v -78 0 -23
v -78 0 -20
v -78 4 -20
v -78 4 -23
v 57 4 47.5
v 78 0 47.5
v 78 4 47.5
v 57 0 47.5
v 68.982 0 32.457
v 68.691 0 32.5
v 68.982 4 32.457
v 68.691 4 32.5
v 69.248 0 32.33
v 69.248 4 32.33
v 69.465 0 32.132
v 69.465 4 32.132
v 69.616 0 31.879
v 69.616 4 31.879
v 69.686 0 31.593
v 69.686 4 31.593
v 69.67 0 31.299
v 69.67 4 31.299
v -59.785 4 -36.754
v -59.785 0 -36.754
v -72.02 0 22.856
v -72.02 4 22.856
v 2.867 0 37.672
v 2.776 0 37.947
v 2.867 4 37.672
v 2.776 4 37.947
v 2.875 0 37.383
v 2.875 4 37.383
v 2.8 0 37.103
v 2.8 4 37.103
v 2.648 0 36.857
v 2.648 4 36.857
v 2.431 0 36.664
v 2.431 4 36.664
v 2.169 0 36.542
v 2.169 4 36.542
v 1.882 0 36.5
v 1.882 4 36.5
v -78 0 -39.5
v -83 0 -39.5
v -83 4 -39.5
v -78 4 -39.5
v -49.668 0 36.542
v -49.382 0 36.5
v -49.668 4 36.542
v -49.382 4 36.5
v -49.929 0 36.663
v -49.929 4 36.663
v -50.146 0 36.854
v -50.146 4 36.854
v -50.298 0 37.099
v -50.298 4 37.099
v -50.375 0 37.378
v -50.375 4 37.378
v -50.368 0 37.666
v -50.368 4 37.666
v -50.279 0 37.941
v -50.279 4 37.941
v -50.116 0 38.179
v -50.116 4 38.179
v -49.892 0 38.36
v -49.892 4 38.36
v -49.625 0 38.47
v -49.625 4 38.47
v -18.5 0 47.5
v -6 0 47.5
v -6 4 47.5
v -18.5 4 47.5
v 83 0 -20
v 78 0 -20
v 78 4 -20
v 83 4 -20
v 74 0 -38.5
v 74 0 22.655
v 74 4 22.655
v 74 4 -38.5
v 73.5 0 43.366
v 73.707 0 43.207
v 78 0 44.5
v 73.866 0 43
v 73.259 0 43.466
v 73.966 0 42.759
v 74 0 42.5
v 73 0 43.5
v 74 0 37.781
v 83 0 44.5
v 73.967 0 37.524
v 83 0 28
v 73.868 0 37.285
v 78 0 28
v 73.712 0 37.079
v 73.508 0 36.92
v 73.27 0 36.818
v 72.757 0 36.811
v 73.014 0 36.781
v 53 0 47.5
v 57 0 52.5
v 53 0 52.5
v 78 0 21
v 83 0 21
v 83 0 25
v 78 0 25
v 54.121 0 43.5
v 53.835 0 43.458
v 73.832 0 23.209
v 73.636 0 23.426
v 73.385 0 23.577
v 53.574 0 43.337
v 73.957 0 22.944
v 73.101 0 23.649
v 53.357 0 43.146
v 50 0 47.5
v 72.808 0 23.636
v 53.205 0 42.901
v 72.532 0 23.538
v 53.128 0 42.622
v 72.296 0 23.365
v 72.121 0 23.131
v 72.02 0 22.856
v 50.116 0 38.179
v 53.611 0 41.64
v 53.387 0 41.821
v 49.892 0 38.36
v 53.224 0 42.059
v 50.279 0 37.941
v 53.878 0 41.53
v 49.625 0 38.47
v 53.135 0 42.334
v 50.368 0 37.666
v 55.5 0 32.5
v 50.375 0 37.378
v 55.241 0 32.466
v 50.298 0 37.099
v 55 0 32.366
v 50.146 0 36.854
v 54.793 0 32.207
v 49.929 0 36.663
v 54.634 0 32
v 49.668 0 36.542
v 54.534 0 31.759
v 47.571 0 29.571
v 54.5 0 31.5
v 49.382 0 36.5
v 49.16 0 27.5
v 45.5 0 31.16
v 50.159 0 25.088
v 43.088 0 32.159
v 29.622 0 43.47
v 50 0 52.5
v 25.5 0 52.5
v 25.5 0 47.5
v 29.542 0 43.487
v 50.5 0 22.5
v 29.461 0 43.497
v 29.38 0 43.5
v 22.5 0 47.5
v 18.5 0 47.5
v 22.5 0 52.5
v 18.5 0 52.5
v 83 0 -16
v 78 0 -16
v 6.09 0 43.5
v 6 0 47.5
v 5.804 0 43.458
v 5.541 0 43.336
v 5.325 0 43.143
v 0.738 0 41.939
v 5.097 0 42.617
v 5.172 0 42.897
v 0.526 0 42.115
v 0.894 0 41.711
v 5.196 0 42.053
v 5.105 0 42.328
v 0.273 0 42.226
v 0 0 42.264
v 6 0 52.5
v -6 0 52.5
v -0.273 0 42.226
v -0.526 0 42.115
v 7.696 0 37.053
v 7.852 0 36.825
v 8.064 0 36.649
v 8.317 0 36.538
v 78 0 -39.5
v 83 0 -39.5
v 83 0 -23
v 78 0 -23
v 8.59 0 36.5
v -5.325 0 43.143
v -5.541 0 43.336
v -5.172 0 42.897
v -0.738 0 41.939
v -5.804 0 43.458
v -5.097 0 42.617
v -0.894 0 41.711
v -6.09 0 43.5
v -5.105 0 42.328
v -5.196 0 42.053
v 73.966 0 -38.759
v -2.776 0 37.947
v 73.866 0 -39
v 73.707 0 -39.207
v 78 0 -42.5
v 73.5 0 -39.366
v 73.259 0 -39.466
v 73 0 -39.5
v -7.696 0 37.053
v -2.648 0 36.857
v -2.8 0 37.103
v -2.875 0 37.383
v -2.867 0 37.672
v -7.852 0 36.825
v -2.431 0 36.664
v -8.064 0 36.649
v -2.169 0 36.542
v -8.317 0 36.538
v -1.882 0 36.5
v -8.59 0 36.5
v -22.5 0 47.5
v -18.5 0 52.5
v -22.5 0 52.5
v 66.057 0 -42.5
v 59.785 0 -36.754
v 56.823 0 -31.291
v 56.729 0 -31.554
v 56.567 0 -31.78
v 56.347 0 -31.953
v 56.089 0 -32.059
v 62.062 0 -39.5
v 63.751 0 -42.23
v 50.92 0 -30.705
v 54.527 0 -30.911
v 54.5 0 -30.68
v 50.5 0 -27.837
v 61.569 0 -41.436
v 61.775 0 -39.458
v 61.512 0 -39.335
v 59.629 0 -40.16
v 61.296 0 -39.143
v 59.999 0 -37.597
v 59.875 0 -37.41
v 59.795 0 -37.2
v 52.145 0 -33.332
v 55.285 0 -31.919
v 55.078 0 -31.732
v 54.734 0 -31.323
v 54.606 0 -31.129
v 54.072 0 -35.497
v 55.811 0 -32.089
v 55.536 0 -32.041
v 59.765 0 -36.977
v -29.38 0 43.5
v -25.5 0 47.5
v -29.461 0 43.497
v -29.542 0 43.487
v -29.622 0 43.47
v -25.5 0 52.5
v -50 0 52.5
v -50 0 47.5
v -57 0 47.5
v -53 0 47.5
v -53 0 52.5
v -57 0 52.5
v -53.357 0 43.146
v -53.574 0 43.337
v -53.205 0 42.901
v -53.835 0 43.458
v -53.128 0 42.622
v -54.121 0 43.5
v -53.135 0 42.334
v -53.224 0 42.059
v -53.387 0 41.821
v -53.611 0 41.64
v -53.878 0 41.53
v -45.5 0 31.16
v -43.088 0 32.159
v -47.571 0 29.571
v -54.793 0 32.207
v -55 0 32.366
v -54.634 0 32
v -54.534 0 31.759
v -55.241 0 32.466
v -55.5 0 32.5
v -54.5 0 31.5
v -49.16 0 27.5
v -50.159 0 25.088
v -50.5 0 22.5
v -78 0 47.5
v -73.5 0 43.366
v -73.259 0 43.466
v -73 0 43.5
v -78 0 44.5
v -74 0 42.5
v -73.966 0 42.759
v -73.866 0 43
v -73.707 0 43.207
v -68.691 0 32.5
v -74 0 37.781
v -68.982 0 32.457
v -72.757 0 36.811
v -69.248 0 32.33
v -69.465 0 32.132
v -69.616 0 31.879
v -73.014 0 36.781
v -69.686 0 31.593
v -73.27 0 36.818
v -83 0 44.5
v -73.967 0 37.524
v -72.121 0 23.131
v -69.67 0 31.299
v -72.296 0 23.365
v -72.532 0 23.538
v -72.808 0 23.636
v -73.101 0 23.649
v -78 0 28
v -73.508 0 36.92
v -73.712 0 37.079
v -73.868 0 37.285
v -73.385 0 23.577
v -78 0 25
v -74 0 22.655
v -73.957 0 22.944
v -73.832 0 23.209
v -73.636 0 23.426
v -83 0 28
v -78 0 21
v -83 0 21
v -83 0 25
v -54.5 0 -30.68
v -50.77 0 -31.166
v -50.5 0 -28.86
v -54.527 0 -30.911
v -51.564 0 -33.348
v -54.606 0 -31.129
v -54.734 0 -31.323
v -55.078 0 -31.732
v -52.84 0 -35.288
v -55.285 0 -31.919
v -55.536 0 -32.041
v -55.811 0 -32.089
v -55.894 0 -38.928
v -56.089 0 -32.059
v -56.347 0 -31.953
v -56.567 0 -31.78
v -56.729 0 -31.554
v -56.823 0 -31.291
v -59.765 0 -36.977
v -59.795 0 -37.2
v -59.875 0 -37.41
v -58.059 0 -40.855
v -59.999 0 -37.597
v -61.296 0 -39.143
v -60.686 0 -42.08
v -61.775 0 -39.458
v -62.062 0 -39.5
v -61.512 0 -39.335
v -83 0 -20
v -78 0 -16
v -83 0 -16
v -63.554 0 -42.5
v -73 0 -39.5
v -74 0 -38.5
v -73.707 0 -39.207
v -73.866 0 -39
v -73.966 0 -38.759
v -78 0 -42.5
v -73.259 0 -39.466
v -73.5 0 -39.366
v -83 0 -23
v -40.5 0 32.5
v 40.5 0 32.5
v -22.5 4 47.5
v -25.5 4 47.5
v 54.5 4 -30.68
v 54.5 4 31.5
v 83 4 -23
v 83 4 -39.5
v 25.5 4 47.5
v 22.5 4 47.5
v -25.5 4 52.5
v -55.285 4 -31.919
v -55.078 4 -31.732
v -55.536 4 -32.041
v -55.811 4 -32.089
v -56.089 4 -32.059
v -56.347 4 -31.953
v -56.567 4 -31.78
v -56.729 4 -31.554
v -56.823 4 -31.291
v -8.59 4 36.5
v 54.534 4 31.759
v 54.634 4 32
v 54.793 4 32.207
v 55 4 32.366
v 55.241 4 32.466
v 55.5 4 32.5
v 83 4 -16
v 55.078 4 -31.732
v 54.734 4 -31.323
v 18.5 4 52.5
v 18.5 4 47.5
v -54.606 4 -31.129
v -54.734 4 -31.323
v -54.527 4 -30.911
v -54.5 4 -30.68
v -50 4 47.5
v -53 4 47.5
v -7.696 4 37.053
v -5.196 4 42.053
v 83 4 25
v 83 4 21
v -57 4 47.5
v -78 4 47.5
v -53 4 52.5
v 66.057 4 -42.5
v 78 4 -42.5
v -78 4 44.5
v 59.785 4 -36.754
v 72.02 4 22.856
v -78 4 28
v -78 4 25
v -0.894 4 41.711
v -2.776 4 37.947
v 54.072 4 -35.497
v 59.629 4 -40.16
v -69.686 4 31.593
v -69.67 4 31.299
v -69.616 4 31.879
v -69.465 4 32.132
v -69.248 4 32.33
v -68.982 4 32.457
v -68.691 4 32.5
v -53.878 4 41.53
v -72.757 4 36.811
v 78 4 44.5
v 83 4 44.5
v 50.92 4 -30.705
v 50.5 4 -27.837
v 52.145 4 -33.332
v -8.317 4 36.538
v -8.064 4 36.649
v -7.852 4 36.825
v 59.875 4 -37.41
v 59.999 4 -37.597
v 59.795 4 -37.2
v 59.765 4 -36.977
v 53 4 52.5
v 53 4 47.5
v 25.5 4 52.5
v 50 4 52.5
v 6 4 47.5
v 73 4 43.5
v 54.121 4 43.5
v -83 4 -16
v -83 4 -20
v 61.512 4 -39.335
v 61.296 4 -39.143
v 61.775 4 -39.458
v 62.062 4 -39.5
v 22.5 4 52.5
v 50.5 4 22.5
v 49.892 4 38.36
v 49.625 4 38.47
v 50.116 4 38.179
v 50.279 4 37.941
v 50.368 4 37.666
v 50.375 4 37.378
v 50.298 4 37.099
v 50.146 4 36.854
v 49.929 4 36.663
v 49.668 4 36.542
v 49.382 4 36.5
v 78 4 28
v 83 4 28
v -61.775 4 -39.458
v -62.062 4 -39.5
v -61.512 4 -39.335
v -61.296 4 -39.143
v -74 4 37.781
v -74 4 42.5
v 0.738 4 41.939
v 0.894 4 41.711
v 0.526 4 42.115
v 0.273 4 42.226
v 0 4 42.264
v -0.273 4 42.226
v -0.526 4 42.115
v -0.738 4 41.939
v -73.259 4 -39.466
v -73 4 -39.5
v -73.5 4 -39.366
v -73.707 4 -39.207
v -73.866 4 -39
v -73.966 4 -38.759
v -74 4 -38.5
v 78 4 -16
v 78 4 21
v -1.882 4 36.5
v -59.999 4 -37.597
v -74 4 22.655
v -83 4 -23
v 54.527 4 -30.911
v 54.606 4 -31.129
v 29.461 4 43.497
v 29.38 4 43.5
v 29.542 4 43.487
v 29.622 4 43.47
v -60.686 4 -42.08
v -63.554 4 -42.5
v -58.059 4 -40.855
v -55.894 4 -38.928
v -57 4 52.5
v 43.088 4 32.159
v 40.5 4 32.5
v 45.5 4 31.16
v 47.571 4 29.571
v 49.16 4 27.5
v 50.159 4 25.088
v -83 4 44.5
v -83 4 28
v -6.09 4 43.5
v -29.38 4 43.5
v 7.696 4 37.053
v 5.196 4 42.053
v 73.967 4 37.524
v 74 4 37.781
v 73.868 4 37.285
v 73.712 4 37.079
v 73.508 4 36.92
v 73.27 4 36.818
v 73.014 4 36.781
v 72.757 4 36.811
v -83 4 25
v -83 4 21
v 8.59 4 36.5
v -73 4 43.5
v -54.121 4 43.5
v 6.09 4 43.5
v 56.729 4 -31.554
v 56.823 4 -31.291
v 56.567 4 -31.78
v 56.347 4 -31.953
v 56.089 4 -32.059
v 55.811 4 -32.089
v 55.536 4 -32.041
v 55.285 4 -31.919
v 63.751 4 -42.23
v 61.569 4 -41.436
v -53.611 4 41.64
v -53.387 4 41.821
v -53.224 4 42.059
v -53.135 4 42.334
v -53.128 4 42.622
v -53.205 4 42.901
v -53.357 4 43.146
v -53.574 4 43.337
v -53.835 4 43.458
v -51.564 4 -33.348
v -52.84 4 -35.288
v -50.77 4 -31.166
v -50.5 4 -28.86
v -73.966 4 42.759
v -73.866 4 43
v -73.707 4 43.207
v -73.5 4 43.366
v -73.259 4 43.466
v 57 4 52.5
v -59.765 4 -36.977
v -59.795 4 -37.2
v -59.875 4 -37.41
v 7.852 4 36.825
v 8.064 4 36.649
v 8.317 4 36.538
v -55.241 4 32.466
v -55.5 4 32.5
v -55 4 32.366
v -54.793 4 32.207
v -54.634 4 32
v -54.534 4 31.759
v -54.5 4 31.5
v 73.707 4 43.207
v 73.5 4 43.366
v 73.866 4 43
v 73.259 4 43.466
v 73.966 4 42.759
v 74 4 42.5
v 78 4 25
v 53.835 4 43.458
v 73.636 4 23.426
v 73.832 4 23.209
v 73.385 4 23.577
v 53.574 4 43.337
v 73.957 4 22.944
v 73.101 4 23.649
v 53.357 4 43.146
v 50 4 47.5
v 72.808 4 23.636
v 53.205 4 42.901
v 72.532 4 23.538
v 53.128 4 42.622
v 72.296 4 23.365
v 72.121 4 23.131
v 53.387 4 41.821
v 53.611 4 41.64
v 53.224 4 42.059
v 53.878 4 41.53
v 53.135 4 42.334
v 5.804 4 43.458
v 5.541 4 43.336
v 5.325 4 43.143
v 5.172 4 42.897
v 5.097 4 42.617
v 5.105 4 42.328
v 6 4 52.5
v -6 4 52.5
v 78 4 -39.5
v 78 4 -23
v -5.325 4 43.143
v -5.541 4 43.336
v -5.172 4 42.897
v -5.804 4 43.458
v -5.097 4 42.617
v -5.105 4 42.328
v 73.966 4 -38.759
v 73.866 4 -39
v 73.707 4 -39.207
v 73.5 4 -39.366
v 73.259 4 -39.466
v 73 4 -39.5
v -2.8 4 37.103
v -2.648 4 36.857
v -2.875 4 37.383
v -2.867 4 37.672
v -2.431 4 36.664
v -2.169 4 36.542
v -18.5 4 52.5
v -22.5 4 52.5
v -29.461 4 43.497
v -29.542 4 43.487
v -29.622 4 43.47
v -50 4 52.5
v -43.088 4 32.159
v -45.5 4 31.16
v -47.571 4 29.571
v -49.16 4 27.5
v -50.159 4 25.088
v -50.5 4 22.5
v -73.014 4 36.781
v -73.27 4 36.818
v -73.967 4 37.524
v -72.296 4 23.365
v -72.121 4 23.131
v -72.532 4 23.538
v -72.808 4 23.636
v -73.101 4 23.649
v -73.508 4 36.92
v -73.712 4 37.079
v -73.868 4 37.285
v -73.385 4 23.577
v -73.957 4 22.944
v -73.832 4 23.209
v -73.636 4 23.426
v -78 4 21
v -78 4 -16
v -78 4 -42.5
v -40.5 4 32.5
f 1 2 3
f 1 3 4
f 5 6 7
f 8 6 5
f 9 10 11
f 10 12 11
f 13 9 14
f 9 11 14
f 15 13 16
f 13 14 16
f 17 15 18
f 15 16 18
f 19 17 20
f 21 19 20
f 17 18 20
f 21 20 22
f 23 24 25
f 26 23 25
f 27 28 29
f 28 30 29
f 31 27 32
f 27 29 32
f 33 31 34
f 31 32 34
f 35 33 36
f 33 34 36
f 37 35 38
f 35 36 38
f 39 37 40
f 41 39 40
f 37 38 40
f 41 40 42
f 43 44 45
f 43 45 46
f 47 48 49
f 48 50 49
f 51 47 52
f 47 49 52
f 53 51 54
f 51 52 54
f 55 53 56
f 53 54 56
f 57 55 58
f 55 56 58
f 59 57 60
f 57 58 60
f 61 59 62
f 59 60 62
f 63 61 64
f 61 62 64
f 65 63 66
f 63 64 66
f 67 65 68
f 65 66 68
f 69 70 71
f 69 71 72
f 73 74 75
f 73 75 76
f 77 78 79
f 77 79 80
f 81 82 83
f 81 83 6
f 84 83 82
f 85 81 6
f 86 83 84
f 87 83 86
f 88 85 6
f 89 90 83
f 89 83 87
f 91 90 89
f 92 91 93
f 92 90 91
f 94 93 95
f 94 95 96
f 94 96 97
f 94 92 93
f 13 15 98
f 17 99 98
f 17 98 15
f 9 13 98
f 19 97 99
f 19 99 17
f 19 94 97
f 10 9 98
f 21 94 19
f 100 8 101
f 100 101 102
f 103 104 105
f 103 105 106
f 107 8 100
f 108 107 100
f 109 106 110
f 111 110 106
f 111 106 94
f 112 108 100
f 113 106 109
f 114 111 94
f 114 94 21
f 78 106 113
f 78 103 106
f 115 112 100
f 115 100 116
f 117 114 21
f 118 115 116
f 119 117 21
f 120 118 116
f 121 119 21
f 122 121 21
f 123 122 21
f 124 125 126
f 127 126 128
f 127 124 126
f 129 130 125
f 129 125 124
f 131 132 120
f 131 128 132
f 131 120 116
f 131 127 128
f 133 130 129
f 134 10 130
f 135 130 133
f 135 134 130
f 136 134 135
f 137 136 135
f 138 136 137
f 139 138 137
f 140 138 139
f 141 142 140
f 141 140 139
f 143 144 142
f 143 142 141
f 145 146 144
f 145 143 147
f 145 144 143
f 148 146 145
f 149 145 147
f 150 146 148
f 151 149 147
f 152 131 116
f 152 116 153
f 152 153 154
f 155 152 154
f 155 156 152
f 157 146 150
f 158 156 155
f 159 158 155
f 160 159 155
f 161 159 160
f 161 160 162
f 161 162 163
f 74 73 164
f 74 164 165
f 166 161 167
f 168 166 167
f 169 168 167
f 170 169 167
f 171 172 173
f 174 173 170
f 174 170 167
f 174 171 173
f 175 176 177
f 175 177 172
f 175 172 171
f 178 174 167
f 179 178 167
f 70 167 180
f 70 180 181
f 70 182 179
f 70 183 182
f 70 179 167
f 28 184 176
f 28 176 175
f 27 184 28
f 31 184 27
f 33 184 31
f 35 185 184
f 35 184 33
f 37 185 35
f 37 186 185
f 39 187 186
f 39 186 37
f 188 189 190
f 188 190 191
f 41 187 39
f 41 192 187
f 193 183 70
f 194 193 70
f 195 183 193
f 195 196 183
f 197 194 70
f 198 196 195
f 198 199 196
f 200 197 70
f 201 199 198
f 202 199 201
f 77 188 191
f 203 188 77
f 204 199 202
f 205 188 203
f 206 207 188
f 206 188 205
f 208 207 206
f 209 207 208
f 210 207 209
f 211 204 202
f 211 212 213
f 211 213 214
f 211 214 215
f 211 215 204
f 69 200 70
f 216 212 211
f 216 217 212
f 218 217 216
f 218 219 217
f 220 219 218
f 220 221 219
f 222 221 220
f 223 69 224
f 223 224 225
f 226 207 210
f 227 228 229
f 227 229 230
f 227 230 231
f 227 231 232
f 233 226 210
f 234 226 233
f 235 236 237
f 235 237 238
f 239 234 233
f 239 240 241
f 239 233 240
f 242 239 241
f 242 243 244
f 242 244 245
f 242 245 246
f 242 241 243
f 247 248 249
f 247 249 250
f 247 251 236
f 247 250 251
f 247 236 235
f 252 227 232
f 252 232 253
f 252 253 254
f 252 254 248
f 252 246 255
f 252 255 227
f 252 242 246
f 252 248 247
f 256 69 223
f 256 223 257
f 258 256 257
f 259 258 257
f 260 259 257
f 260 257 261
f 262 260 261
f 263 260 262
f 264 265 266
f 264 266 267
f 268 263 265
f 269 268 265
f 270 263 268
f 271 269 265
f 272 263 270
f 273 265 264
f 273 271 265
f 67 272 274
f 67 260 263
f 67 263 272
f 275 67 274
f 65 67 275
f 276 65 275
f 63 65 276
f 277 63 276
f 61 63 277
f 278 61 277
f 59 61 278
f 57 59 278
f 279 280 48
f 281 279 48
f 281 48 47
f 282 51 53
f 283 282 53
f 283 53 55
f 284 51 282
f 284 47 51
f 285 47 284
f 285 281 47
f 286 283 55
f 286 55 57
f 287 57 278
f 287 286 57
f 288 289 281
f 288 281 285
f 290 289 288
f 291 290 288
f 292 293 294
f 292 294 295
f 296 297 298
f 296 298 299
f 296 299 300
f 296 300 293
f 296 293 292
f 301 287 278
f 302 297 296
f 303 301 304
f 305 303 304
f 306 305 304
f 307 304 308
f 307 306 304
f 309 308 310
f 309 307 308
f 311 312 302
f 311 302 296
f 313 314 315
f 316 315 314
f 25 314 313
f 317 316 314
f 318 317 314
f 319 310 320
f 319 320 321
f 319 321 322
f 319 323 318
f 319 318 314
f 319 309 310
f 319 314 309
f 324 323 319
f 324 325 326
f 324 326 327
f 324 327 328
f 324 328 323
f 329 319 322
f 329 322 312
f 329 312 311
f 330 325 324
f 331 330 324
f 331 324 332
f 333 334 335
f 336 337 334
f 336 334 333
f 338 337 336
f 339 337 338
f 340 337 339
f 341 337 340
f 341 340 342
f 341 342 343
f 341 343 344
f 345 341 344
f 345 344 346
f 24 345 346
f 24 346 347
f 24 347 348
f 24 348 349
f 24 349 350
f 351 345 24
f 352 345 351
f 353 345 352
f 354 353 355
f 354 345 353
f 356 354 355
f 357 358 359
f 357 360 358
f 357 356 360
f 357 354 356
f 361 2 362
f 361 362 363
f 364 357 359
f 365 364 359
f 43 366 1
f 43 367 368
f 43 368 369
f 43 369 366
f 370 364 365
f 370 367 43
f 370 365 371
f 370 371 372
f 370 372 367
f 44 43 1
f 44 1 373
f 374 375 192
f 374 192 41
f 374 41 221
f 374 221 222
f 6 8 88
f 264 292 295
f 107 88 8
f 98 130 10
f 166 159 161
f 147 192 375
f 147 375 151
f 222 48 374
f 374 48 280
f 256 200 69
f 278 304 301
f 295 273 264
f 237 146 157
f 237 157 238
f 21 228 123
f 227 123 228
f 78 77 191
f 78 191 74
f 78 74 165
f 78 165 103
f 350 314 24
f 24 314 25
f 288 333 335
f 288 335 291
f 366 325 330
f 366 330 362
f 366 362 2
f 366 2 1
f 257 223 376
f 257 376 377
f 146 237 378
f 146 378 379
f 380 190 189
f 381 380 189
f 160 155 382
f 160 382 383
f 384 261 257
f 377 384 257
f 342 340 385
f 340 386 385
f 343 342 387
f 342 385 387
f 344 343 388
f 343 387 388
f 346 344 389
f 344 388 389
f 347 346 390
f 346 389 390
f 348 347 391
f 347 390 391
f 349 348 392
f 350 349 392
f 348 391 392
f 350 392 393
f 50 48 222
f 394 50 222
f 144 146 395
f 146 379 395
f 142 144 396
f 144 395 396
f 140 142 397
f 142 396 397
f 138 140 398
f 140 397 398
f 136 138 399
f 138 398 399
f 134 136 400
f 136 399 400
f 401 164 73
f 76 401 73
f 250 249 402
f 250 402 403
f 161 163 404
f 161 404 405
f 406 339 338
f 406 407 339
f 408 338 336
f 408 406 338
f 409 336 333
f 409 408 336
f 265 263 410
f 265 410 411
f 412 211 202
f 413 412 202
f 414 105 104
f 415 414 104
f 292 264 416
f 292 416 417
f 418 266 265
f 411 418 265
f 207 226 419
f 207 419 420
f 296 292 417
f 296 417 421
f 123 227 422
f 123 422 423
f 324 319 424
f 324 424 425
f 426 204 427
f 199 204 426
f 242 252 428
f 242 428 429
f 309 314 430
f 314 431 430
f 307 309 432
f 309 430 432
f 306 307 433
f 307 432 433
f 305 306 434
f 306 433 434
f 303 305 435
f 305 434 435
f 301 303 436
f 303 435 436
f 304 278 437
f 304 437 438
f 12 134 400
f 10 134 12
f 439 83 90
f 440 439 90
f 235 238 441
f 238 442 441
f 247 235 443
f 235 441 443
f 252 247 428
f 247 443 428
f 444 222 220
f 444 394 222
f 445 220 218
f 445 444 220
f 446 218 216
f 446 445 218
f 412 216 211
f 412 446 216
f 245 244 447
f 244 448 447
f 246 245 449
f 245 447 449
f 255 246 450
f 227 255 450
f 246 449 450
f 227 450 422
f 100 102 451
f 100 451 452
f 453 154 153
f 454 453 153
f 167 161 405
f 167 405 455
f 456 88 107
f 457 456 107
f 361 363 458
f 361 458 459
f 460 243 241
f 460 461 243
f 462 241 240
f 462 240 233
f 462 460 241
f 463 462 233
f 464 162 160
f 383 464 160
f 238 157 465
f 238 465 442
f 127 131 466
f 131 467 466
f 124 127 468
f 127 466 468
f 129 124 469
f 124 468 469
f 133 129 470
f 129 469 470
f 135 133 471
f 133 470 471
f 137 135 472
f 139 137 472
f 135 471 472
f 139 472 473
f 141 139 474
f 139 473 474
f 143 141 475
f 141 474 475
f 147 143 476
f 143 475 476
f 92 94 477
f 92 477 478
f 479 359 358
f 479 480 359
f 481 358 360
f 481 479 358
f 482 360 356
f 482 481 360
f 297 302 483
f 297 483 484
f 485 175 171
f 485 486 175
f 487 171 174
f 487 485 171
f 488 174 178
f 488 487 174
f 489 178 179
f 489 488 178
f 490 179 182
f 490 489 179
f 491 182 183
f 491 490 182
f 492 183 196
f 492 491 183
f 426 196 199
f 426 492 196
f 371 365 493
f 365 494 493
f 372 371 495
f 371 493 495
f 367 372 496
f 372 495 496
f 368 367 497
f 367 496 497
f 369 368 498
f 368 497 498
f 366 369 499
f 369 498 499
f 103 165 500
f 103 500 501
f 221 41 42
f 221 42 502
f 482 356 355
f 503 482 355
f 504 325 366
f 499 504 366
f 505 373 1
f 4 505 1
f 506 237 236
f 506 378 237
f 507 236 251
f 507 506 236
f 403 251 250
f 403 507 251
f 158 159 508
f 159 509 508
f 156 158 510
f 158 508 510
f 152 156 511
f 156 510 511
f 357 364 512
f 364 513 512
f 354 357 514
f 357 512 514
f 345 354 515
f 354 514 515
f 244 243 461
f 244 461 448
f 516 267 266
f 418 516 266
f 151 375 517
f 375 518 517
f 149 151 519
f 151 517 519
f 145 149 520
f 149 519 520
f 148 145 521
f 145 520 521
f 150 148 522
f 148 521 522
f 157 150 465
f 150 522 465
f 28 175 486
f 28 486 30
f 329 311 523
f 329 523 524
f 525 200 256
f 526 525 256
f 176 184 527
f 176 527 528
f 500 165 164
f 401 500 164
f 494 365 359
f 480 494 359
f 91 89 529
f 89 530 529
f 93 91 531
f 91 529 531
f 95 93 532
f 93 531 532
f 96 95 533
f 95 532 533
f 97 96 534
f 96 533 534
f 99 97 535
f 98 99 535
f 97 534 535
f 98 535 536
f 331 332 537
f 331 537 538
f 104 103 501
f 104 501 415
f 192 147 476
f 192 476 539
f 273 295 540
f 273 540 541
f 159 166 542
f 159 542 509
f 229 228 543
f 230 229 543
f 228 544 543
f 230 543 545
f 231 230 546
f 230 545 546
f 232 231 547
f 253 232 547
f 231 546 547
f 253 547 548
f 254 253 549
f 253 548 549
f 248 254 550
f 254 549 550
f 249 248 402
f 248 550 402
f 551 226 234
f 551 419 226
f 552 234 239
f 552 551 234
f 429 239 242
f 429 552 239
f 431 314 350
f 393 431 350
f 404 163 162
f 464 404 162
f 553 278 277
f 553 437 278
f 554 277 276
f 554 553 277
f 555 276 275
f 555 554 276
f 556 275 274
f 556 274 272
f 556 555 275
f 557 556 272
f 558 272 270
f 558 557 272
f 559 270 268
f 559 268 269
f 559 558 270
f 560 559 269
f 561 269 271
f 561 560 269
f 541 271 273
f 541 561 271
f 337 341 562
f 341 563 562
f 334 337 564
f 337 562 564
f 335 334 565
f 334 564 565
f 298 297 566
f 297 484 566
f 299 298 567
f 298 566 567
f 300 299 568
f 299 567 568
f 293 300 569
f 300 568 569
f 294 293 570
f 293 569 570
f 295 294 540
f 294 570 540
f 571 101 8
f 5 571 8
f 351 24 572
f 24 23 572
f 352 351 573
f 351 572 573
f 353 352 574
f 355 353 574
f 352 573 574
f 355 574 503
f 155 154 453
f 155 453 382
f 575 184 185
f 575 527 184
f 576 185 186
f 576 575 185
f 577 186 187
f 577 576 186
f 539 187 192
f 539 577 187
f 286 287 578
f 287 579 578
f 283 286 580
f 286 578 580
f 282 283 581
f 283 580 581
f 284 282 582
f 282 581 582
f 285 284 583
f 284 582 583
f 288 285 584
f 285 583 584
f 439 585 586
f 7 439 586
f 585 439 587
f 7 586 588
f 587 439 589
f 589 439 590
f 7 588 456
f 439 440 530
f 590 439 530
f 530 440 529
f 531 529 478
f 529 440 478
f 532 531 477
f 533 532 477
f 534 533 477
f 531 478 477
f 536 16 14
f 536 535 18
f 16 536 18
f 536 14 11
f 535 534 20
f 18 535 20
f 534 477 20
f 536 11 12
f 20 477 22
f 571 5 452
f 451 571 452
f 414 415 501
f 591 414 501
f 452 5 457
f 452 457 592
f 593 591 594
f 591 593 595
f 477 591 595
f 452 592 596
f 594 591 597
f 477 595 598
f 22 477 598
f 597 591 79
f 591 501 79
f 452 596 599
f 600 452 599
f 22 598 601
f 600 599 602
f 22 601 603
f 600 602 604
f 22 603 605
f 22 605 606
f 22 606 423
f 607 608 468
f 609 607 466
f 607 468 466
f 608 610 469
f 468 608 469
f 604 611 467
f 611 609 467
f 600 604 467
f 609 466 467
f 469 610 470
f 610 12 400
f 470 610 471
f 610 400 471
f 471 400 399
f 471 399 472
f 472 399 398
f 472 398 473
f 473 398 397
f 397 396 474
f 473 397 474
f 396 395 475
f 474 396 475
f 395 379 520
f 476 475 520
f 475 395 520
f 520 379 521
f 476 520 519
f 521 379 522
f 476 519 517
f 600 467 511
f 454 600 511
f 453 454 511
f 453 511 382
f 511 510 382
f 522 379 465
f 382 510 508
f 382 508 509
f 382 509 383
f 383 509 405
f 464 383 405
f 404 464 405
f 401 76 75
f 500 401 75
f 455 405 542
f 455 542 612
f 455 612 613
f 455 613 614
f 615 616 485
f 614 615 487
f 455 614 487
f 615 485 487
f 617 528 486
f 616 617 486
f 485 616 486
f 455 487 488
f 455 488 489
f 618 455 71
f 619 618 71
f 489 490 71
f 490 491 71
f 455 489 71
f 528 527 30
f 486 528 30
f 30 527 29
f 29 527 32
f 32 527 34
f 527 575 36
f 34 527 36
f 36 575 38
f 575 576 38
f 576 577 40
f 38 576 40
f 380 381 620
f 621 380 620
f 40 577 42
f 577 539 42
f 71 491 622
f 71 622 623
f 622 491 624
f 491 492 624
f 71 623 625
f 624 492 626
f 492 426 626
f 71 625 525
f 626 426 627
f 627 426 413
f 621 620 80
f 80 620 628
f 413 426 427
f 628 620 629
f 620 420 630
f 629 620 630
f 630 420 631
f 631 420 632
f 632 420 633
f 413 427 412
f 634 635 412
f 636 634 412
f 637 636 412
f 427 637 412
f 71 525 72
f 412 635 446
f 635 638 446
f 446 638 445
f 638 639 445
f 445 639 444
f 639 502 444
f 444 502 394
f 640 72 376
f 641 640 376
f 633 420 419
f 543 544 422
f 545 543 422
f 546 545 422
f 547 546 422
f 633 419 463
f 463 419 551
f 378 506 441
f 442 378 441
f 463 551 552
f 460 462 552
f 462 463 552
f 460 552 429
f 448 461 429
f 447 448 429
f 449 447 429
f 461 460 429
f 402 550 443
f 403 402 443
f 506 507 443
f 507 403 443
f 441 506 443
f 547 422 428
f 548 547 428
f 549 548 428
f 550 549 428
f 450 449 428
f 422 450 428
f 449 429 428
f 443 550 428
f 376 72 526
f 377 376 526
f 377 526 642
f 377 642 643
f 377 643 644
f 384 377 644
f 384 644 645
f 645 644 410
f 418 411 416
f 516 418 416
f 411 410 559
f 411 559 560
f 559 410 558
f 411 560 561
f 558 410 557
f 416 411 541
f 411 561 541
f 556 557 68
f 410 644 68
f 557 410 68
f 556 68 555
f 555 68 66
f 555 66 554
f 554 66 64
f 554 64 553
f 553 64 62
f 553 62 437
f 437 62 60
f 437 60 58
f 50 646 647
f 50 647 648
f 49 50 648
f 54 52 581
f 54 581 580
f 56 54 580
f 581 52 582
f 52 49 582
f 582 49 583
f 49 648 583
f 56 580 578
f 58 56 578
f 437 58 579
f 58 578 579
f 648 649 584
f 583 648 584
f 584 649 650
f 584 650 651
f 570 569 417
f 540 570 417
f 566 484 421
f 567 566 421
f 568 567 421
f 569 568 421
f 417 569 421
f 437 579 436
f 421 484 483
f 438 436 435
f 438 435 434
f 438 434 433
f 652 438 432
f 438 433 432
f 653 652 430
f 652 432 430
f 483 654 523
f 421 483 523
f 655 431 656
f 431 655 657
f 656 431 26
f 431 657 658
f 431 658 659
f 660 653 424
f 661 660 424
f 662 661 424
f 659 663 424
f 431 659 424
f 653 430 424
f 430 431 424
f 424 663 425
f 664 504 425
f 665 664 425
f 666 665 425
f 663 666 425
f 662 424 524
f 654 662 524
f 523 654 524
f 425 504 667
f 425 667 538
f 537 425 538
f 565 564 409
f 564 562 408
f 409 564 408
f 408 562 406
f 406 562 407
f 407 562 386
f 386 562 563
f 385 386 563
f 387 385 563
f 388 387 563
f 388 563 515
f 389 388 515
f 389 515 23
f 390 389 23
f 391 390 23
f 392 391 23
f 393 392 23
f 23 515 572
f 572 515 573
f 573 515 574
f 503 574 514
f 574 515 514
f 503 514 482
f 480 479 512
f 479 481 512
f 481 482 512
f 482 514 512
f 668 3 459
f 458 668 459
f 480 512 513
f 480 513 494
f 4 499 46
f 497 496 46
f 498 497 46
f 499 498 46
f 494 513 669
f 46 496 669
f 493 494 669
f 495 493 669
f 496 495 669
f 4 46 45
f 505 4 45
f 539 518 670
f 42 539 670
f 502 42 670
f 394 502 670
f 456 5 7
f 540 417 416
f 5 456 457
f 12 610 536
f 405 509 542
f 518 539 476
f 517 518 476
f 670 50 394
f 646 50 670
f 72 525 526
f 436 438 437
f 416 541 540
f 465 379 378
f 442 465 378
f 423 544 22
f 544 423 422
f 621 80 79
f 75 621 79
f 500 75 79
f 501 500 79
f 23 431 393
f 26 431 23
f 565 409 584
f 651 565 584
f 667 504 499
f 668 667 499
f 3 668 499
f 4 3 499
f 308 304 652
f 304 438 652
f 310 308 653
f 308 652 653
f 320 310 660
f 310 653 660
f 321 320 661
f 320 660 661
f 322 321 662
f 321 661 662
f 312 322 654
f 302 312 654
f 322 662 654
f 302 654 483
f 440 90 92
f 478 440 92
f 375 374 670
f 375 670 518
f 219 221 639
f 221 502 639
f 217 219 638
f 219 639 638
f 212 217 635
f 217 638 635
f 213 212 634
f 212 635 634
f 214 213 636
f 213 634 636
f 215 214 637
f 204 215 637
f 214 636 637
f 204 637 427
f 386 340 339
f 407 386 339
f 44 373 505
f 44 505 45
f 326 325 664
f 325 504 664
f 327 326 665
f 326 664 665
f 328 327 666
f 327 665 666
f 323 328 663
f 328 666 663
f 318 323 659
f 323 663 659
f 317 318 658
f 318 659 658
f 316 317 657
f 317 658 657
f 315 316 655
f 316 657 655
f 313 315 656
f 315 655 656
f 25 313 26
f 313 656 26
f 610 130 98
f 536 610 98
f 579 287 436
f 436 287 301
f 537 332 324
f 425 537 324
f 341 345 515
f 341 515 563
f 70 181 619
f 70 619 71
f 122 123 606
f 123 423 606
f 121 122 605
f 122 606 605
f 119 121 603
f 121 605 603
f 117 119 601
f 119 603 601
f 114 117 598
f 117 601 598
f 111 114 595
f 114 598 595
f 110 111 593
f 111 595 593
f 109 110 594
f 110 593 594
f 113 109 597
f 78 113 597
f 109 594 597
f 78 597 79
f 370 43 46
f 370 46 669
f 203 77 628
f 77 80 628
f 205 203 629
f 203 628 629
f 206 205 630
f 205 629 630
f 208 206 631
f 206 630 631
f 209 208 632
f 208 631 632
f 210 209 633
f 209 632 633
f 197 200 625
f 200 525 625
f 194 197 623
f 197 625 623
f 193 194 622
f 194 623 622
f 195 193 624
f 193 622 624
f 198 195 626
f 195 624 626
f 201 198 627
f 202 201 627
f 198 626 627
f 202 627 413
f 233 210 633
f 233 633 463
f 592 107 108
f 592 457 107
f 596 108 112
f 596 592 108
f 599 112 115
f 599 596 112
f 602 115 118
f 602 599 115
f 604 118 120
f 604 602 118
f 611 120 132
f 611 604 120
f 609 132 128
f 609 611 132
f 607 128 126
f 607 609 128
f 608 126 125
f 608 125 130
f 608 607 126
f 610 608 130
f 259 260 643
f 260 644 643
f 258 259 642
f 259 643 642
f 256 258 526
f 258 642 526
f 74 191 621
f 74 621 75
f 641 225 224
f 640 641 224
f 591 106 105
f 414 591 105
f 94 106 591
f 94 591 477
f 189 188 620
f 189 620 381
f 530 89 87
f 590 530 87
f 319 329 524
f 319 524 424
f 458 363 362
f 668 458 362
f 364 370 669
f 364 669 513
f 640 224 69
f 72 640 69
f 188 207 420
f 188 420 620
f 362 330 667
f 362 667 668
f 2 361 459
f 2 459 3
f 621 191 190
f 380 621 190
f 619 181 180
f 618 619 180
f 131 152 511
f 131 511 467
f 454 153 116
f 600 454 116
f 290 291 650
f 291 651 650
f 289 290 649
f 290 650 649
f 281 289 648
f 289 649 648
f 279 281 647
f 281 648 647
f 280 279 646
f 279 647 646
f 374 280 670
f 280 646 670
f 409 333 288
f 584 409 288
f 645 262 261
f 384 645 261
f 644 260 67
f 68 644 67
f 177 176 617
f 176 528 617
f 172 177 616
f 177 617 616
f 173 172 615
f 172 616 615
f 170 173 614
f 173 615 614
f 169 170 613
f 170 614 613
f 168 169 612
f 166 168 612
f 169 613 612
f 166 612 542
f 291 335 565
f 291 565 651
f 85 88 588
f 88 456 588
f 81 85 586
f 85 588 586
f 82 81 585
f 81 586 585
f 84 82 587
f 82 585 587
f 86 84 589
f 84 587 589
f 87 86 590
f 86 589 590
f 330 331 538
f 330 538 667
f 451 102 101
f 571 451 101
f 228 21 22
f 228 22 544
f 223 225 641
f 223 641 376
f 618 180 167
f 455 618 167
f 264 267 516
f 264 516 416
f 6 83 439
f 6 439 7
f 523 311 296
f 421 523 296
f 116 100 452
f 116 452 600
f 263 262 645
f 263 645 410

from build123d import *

# Parameters (mm, degrees)
SKETCH1_W           = 5
SKETCH1_H           = 16.5
SKETCH1_W_2         = 12
SKETCH1_H_2         = 5
SKETCH1_H_3         = 4
SKETCH1_W_3         = 24.5
SKETCH1_W_4         = 4
BOSS_EXTRUDE1_DEPTH = 4
FILLET1_R           = 10
FILLET2_R           = 1


with BuildPart() as part:
    # Sketch1 → Boss-Extrude1 (new body)
    # profile 1 of 16: a face of its own
    with BuildSketch(Plane(origin=(0, 0, 0), x_dir=(1, 0, 0), z_dir=(0, 1, 0))):
        Polygon((-78, 42.5), (-58.890996312, 42.5), (-50.5, 32.5), (-50.5, -32.5), (50.5, -32.5), (50.5, 32.5), (62.417535926, 42.5), (78, 42.5), (78, -47.5), (-78, -47.5), align=None)
        Polygon((-74, 39.5), (-61.595326576, 39.5), (-59.688086754, 37.22704009), (-74, -32.5), align=None, mode=Mode.SUBTRACT)
        Polygon((-56.407239822, 33.317078972), (-54.5, 31.044119063), (-54.5, -32.5), (-69.916608972, -32.5), align=None, mode=Mode.SUBTRACT)
        Polygon((-74, -36.5), (-74, -43.5), (-45.997033515, -43.5), align=None, mode=Mode.SUBTRACT)
        Polygon((-57.50593297, -36.5), (-7.972135955, -36.5), (-4.472135955, -43.5), (-29.502966485, -43.5), align=None, mode=Mode.SUBTRACT)
        Polygon((3.5, -36.5), (-3.5, -36.5), (0, -43.5), align=None, mode=Mode.SUBTRACT)
        Polygon((4.472135955, -43.5), (29.502966485, -43.5), (57.50593297, -36.5), (7.972135955, -36.5), align=None, mode=Mode.SUBTRACT)
        Polygon((74, -43.5), (45.997033515, -43.5), (74, -36.5), align=None, mode=Mode.SUBTRACT)
        Polygon((54.5, -32.5), (69.916608972, -32.5), (56.407239822, 33.317078972), (54.5, 31.044119063), align=None, mode=Mode.SUBTRACT)
        Polygon((59.688086754, 37.22704009), (74, -32.5), (74, 39.5), (61.595326576, 39.5), align=None, mode=Mode.SUBTRACT)
    # profile 2 of 16: a face of its own
    with BuildSketch(Plane(origin=(0, 0, 0), x_dir=(1, 0, 0), z_dir=(0, 1, 0))):
        with Locations((80.5, 31.25)):
            Rectangle(SKETCH1_W, SKETCH1_H)
    # profile 3 of 16: a face of its own
    with BuildSketch(Plane(origin=(0, 0, 0), x_dir=(1, 0, 0), z_dir=(0, 1, 0))):
        with Locations((80.5, -36.25)):
            Rectangle(SKETCH1_W, SKETCH1_H)
    # profile 4 of 16: a face of its own
    with BuildSketch(Plane(origin=(0, 0, 0), x_dir=(1, 0, 0), z_dir=(0, 1, 0))):
        with Locations((0, -50)):
            Rectangle(SKETCH1_W_2, SKETCH1_H_2)
    # profile 5 of 16: a face of its own
    with BuildSketch(Plane(origin=(0, 0, 0), x_dir=(1, 0, 0), z_dir=(0, 1, 0))):
        with Locations((80.5, 18)):
            Rectangle(SKETCH1_W, SKETCH1_H_3)
    # profile 6 of 16: a face of its own
    with BuildSketch(Plane(origin=(0, 0, 0), x_dir=(1, 0, 0), z_dir=(0, 1, 0))):
        with Locations((80.5, -23)):
            Rectangle(SKETCH1_W, SKETCH1_H_3)
    # profile 7 of 16: a face of its own
    with BuildSketch(Plane(origin=(0, 0, 0), x_dir=(1, 0, 0), z_dir=(0, 1, 0))):
        with Locations((37.75, -50)):
            Rectangle(SKETCH1_W_3, SKETCH1_H_2)
    # profile 8 of 16: a face of its own
    with BuildSketch(Plane(origin=(0, 0, 0), x_dir=(1, 0, 0), z_dir=(0, 1, 0))):
        with Locations((55, -50)):
            Rectangle(SKETCH1_W_4, SKETCH1_H_2)
    # profile 9 of 16: a face of its own
    with BuildSketch(Plane(origin=(0, 0, 0), x_dir=(1, 0, 0), z_dir=(0, 1, 0))):
        with Locations((20.5, -50)):
            Rectangle(SKETCH1_W_4, SKETCH1_H_2)
    # profile 10 of 16: a face of its own
    with BuildSketch(Plane(origin=(0, 0, 0), x_dir=(1, 0, 0), z_dir=(0, 1, 0))):
        with Locations((-20.5, -50)):
            Rectangle(SKETCH1_W_4, SKETCH1_H_2)
    # profile 11 of 16: a face of its own
    with BuildSketch(Plane(origin=(0, 0, 0), x_dir=(1, 0, 0), z_dir=(0, 1, 0))):
        with Locations((-37.75, -50)):
            Rectangle(SKETCH1_W_3, SKETCH1_H_2)
    # profile 12 of 16: a face of its own
    with BuildSketch(Plane(origin=(0, 0, 0), x_dir=(1, 0, 0), z_dir=(0, 1, 0))):
        with Locations((-55, -50)):
            Rectangle(SKETCH1_W_4, SKETCH1_H_2)
    # profile 13 of 16: a face of its own
    with BuildSketch(Plane(origin=(0, 0, 0), x_dir=(1, 0, 0), z_dir=(0, 1, 0))):
        with Locations((-80.5, -36.25)):
            Rectangle(SKETCH1_W, SKETCH1_H)
    # profile 14 of 16: a face of its own
    with BuildSketch(Plane(origin=(0, 0, 0), x_dir=(1, 0, 0), z_dir=(0, 1, 0))):
        with Locations((-80.5, -23)):
            Rectangle(SKETCH1_W, SKETCH1_H_3)
    # profile 15 of 16: a face of its own
    with BuildSketch(Plane(origin=(0, 0, 0), x_dir=(1, 0, 0), z_dir=(0, 1, 0))):
        with Locations((-80.5, 18)):
            Rectangle(SKETCH1_W, SKETCH1_H_3)
    # profile 16 of 16: a face of its own
    with BuildSketch(Plane(origin=(0, 0, 0), x_dir=(1, 0, 0), z_dir=(0, 1, 0))):
        with Locations((-80.5, 31.25)):
            Rectangle(SKETCH1_W, SKETCH1_H)
    extrude(amount=BOSS_EXTRUDE1_DEPTH)

    # Fillet1
    fillet1_edges = [part.edges().sort_by_distance(p)[0] for p in [
        (-58.890996312, 2, -42.5),
        (-50.5, 2, -32.5),
        (-50.5, 2, 32.5),
        (50.5, 2, 32.5),
        (50.5, 2, -32.5),
        (62.417535926, 2, -42.5),
    ]]
    fillet(fillet1_edges, radius=FILLET1_R)

    # Fillet2
    fillet2_edges = [part.edges().sort_by_distance(p)[0] for p in [
        (74, 2, 43.5),
        (74, 2, 36.5),
        (45.997033515, 2, 43.5),
        (-3.5, 2, 36.5),
        (0, 2, 43.5),
        (3.5, 2, 36.5),
        (-4.472135955, 2, 43.5),
        (-7.972135955, 2, 36.5),
        (-57.50593297, 2, 36.5),
        (-29.502966485, 2, 43.5),
        (-54.5, 2, 32.5),
        (-54.5, 2, -31.044119063),
        (-56.407239822, 2, -33.317078972),
        (-69.916608972, 2, 32.5),
        (-59.688086754, 2, -37.22704009),
        (-61.595326576, 2, -39.5),
        (-74, 2, -39.5),
        (-74, 2, 32.5),
        (-74, 2, 36.5),
        (-74, 2, 43.5),
        (-45.997033515, 2, 43.5),
        (57.50593297, 2, 36.5),
        (7.972135955, 2, 36.5),
        (4.472135955, 2, 43.5),
        (29.502966485, 2, 43.5),
        (56.407239822, 2, -33.317078972),
        (54.5, 2, -31.044119063),
        (54.5, 2, 32.5),
        (69.916608972, 2, 32.5),
        (74, 2, -39.5),
        (61.595326576, 2, -39.5),
        (59.688086754, 2, -37.22704009),
        (74, 2, 32.5),
    ]]
    fillet(fillet2_edges, radius=FILLET2_R)


solid = part.part
